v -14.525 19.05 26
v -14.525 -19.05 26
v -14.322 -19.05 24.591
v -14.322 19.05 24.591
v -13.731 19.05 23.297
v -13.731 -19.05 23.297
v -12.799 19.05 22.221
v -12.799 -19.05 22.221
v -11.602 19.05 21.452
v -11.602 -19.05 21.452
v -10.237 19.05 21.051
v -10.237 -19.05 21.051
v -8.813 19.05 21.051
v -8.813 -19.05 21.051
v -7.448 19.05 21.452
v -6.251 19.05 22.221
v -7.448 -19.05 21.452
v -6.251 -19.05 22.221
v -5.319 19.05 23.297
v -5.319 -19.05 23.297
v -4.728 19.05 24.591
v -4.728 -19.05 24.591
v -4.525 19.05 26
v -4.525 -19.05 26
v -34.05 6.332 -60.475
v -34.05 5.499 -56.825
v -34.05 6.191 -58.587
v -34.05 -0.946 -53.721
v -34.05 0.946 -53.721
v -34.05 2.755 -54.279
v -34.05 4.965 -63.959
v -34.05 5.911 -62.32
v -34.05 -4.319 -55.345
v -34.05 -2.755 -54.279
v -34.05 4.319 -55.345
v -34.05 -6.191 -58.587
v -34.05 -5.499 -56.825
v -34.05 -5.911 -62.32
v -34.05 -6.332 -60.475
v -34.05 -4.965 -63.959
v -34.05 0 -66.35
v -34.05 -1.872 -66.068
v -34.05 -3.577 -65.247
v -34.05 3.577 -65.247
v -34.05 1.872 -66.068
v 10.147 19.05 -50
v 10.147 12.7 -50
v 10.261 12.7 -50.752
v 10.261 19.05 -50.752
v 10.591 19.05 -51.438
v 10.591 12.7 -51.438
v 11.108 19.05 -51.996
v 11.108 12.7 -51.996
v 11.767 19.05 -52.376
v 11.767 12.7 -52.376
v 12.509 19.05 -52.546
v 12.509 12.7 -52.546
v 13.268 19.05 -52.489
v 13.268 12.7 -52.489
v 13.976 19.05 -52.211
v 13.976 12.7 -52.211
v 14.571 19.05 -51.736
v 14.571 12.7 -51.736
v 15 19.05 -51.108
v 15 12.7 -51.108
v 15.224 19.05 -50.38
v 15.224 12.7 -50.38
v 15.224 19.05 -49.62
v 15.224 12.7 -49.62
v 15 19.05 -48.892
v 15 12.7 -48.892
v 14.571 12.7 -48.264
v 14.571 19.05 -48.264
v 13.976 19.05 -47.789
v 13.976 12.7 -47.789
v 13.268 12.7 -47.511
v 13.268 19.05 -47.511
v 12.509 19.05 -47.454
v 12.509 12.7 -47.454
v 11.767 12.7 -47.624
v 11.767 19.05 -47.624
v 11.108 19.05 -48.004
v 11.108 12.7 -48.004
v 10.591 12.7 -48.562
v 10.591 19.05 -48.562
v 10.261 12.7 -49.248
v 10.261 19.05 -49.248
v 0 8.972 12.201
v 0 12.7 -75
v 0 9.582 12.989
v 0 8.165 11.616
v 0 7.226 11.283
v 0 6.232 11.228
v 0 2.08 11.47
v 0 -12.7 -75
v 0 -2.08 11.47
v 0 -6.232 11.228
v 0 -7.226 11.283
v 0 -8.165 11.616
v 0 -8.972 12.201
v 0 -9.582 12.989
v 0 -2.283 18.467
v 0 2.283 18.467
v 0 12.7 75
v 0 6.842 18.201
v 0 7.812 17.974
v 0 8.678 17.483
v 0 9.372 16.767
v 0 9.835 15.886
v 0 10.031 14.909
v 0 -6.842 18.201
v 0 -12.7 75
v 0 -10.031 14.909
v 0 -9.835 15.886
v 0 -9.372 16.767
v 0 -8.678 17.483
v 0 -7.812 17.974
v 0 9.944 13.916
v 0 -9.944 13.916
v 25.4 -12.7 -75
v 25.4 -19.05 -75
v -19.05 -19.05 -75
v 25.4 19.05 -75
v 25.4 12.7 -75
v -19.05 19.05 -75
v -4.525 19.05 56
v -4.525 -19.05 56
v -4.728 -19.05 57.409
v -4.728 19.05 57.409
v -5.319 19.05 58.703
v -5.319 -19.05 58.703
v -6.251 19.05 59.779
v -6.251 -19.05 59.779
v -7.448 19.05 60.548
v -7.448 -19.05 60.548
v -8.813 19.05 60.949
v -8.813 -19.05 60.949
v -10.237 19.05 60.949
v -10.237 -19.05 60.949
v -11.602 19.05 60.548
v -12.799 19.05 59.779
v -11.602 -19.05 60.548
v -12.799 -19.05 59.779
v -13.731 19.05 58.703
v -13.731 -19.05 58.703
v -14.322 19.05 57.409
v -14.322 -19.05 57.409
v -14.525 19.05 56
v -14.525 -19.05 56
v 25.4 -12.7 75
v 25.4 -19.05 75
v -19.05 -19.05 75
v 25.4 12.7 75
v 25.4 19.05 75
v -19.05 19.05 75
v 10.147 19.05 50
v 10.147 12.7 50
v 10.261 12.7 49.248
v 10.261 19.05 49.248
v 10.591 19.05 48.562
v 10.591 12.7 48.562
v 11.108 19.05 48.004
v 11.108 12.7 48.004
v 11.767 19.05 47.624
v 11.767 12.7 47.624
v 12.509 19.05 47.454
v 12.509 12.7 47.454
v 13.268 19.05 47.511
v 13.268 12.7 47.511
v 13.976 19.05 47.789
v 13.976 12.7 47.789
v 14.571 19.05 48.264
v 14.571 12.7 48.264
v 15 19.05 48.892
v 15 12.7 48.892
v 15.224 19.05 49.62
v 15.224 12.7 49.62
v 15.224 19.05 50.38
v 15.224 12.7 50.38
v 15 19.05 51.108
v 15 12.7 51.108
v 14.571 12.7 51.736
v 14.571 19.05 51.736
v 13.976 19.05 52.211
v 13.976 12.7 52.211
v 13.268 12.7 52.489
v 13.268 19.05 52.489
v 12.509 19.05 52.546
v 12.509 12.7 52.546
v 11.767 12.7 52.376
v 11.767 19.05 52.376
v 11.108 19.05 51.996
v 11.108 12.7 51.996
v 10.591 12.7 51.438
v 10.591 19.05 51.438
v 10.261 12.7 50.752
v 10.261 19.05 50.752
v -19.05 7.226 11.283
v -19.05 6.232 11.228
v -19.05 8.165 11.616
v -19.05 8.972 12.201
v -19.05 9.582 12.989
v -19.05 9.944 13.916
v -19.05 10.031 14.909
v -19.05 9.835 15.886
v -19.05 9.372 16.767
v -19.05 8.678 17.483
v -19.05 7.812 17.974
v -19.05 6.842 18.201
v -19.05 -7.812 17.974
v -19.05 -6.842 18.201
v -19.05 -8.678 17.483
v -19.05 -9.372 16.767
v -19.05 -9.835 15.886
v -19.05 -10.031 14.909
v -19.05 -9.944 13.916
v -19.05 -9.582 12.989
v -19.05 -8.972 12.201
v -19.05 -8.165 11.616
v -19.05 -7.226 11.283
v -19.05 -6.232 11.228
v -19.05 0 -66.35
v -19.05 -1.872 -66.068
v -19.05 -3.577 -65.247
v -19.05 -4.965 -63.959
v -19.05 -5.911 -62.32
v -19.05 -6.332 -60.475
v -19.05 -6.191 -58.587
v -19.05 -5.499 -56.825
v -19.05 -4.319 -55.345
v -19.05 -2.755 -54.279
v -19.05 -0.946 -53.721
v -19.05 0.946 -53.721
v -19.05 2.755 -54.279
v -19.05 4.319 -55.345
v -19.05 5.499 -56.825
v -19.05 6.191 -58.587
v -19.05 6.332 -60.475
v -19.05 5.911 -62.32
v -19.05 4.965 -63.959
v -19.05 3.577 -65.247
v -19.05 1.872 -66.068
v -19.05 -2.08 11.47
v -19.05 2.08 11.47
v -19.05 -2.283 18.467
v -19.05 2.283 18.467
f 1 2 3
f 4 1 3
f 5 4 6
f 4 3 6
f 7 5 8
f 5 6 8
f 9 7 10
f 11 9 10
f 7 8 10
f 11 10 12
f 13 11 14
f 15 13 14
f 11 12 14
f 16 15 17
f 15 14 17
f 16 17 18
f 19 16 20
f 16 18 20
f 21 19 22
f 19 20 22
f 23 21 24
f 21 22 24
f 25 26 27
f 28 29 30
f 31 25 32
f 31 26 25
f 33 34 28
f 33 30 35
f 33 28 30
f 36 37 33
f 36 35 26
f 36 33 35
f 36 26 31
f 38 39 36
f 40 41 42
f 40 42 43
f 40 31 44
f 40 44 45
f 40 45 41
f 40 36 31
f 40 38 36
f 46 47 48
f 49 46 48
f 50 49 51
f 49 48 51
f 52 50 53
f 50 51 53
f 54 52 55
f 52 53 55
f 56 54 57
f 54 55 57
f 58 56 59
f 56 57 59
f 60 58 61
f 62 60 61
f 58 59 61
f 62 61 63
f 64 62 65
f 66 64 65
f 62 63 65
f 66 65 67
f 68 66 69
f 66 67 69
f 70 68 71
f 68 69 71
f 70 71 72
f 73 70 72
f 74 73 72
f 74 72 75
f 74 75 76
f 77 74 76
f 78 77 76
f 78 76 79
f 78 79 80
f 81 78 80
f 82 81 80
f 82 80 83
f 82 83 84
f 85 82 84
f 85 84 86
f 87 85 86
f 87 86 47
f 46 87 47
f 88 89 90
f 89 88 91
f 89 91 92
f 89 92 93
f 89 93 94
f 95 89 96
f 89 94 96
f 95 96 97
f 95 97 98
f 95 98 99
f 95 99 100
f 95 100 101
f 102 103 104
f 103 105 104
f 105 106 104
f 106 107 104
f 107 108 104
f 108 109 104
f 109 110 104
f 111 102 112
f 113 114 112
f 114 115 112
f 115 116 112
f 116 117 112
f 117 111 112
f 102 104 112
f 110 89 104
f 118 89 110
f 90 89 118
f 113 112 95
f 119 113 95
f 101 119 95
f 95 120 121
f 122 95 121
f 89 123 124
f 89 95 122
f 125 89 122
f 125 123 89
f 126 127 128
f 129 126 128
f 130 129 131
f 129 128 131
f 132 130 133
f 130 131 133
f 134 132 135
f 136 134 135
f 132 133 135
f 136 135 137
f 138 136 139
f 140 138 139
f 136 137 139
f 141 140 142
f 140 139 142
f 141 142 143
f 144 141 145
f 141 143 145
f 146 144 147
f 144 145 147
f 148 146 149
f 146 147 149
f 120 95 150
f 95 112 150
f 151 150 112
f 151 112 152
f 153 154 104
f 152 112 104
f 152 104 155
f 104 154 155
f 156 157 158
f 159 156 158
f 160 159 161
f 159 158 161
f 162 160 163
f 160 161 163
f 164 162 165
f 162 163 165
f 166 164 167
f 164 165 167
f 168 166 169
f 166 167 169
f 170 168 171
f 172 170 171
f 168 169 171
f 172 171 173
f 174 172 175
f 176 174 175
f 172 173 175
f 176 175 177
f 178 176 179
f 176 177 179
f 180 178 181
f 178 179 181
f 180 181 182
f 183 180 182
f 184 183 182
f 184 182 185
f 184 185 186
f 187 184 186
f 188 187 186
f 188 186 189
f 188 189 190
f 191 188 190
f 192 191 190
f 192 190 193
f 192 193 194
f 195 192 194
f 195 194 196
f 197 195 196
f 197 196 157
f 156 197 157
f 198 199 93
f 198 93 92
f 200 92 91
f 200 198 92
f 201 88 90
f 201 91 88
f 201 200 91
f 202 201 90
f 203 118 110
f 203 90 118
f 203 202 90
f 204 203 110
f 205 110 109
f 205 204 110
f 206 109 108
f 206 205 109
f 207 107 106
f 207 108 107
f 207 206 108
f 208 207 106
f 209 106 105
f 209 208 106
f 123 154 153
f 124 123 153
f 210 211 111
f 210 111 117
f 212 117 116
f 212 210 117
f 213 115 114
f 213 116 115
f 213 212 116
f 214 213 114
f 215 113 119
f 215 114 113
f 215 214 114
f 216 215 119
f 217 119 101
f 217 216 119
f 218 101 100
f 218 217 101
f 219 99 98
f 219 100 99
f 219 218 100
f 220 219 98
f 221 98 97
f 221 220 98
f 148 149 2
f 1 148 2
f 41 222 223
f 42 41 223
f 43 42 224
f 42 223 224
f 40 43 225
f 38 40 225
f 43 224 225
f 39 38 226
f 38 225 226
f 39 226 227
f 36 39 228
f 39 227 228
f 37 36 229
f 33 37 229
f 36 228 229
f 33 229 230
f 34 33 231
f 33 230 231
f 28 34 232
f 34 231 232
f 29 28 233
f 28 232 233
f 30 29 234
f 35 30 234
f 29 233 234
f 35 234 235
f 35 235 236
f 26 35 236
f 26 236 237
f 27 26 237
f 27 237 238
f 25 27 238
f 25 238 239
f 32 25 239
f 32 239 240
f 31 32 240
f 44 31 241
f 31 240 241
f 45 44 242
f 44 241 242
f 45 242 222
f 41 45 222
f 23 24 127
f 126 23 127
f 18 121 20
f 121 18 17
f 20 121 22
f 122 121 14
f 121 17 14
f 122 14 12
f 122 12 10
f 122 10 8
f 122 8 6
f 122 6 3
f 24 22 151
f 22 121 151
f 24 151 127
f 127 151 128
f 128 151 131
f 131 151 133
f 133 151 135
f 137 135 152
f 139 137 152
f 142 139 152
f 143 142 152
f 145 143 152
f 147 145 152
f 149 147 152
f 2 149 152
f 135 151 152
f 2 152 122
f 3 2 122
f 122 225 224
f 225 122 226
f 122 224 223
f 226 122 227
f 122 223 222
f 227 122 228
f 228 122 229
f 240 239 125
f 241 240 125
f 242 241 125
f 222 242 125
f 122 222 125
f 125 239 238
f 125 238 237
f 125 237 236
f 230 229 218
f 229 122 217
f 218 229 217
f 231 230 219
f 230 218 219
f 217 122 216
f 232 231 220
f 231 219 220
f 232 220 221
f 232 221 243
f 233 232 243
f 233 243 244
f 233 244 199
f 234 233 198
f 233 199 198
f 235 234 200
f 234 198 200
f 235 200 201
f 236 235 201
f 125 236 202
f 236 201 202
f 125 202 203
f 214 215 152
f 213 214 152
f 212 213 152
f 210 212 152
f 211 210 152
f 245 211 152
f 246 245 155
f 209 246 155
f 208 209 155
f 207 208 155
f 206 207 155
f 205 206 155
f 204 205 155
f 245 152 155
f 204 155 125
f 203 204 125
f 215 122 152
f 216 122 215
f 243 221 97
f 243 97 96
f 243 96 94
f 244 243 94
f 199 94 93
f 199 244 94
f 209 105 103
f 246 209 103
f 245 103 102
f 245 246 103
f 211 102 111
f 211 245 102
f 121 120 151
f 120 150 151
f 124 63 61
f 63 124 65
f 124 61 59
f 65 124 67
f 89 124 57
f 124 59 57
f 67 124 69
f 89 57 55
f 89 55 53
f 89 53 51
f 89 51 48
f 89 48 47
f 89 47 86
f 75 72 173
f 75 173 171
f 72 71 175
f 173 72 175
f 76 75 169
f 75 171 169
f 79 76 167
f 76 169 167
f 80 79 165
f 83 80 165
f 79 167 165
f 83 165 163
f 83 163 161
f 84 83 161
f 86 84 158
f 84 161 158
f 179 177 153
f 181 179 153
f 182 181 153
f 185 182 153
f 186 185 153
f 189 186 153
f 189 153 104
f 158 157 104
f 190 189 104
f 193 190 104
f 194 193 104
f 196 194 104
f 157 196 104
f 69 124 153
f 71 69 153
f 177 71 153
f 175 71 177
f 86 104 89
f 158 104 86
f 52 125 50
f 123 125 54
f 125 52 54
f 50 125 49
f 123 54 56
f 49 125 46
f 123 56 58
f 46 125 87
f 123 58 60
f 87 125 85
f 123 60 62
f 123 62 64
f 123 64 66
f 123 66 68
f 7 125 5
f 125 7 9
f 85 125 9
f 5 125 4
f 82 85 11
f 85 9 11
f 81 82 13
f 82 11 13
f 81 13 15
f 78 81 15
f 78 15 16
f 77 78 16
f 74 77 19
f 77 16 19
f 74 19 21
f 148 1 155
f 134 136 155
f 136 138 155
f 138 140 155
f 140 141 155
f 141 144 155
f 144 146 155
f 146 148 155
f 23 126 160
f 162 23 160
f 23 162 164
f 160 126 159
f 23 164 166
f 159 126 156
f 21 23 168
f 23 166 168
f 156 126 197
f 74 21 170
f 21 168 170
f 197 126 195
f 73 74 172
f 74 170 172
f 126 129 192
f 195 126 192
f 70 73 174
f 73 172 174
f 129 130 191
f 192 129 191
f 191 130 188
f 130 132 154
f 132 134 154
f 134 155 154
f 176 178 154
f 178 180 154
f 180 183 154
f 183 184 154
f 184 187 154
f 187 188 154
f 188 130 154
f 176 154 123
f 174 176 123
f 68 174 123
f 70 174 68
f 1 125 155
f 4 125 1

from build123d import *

# Parameters (mm, degrees)
SALIENTE_EXTRUIR1_DEPTH       = 75
CROQUIS2_R                    = 6.35
SALIENTE_EXTRUIR2_DEPTH       = 15
CORTAR_EXTRUIR1_DEPTH         = 85.541735255
CORTAR_EXTRUIR1_DEPTH_BACK    = 85.541735255
CORTAR_EXTRUIR2_DEPTH         = 85.541735255
CORTAR_EXTRUIR2_DEPTH_BACK    = 85.541735255
TALADRO_ROSCADO_1_4_201_D     = 5.1054
TALADRO_ROSCADO_1_4_201_DEPTH = 6.35


with BuildPart() as part:
    # Croquis1 → Saliente-Extruir1 (new, symmetric)
    with BuildSketch(Plane.XY):
        Polygon((0, 12.7), (0, -12.7), (25.4, -12.7), (25.4, -19.05), (-19.05, -19.05), (-19.05, 19.05), (25.4, 19.05), (25.4, 12.7), align=None)
    extrude(amount=SALIENTE_EXTRUIR1_DEPTH, both=True)

    # Croquis2 → Saliente-Extruir2 (add)
    with BuildSketch(Plane.ZY.offset(19.05)):
        with Locations(Location((-60, 0, 0), (0, 0, 180))):
            Circle(CROQUIS2_R)
    extrude(amount=SALIENTE_EXTRUIR2_DEPTH)

    # Croquis3 → Cortar-Extruir1 (cut, two sides: drawn at the far end of the back side and taken through both)
    with BuildSketch(Plane(origin=(0, 0, 0), x_dir=(1, 0, 0), z_dir=(0, 1, 0)).offset(-CORTAR_EXTRUIR1_DEPTH_BACK)):
        with BuildLine():
            Line((-4.525, -26), (-4.525, -56))
            ThreePointArc((-4.525, -56), (-9.525, -61), (-14.525, -56))
            Line((-14.525, -56), (-14.525, -26))
            ThreePointArc((-14.525, -26), (-9.525, -21), (-4.525, -26))
        make_face()
    extrude(amount=CORTAR_EXTRUIR1_DEPTH + CORTAR_EXTRUIR1_DEPTH_BACK, mode=Mode.SUBTRACT)

    # Croquis4 → Cortar-Extruir2 (cut, two sides: drawn at the far end of the back side and taken through both)
    with BuildSketch(Plane(origin=(0, 0, 0), x_dir=(0, 0, -1), z_dir=(1, 0, 0)).offset(-CORTAR_EXTRUIR2_DEPTH_BACK)):
        with BuildLine():
            ThreePointArc((-18.2012838, 6.841725806), (-18.5, 0), (-18.2012838, -6.841725806))
            ThreePointArc((-18.2012838, -6.841725806), (-14.409557257, -10.023362149), (-11.227920914, -6.231635606))
            ThreePointArc((-11.227920914, -6.231635606), (-11.5, 0), (-11.227920914, 6.231635606))
            ThreePointArc((-11.227920914, 6.231635606), (-14.409557257, 10.023362149), (-18.2012838, 6.841725806))
        make_face()
    extrude(amount=CORTAR_EXTRUIR2_DEPTH + CORTAR_EXTRUIR2_DEPTH_BACK, mode=Mode.SUBTRACT)

    # Taladro roscado 1/4-201
    with Locations(Plane(origin=(0, 19.05, 0), x_dir=(1, 0, 0), z_dir=(0, 1, 0))):
        with Locations((12.7, -50), (12.7, 50)):
            Hole(TALADRO_ROSCADO_1_4_201_D / 2, depth=TALADRO_ROSCADO_1_4_201_DEPTH)


solid = part.part
